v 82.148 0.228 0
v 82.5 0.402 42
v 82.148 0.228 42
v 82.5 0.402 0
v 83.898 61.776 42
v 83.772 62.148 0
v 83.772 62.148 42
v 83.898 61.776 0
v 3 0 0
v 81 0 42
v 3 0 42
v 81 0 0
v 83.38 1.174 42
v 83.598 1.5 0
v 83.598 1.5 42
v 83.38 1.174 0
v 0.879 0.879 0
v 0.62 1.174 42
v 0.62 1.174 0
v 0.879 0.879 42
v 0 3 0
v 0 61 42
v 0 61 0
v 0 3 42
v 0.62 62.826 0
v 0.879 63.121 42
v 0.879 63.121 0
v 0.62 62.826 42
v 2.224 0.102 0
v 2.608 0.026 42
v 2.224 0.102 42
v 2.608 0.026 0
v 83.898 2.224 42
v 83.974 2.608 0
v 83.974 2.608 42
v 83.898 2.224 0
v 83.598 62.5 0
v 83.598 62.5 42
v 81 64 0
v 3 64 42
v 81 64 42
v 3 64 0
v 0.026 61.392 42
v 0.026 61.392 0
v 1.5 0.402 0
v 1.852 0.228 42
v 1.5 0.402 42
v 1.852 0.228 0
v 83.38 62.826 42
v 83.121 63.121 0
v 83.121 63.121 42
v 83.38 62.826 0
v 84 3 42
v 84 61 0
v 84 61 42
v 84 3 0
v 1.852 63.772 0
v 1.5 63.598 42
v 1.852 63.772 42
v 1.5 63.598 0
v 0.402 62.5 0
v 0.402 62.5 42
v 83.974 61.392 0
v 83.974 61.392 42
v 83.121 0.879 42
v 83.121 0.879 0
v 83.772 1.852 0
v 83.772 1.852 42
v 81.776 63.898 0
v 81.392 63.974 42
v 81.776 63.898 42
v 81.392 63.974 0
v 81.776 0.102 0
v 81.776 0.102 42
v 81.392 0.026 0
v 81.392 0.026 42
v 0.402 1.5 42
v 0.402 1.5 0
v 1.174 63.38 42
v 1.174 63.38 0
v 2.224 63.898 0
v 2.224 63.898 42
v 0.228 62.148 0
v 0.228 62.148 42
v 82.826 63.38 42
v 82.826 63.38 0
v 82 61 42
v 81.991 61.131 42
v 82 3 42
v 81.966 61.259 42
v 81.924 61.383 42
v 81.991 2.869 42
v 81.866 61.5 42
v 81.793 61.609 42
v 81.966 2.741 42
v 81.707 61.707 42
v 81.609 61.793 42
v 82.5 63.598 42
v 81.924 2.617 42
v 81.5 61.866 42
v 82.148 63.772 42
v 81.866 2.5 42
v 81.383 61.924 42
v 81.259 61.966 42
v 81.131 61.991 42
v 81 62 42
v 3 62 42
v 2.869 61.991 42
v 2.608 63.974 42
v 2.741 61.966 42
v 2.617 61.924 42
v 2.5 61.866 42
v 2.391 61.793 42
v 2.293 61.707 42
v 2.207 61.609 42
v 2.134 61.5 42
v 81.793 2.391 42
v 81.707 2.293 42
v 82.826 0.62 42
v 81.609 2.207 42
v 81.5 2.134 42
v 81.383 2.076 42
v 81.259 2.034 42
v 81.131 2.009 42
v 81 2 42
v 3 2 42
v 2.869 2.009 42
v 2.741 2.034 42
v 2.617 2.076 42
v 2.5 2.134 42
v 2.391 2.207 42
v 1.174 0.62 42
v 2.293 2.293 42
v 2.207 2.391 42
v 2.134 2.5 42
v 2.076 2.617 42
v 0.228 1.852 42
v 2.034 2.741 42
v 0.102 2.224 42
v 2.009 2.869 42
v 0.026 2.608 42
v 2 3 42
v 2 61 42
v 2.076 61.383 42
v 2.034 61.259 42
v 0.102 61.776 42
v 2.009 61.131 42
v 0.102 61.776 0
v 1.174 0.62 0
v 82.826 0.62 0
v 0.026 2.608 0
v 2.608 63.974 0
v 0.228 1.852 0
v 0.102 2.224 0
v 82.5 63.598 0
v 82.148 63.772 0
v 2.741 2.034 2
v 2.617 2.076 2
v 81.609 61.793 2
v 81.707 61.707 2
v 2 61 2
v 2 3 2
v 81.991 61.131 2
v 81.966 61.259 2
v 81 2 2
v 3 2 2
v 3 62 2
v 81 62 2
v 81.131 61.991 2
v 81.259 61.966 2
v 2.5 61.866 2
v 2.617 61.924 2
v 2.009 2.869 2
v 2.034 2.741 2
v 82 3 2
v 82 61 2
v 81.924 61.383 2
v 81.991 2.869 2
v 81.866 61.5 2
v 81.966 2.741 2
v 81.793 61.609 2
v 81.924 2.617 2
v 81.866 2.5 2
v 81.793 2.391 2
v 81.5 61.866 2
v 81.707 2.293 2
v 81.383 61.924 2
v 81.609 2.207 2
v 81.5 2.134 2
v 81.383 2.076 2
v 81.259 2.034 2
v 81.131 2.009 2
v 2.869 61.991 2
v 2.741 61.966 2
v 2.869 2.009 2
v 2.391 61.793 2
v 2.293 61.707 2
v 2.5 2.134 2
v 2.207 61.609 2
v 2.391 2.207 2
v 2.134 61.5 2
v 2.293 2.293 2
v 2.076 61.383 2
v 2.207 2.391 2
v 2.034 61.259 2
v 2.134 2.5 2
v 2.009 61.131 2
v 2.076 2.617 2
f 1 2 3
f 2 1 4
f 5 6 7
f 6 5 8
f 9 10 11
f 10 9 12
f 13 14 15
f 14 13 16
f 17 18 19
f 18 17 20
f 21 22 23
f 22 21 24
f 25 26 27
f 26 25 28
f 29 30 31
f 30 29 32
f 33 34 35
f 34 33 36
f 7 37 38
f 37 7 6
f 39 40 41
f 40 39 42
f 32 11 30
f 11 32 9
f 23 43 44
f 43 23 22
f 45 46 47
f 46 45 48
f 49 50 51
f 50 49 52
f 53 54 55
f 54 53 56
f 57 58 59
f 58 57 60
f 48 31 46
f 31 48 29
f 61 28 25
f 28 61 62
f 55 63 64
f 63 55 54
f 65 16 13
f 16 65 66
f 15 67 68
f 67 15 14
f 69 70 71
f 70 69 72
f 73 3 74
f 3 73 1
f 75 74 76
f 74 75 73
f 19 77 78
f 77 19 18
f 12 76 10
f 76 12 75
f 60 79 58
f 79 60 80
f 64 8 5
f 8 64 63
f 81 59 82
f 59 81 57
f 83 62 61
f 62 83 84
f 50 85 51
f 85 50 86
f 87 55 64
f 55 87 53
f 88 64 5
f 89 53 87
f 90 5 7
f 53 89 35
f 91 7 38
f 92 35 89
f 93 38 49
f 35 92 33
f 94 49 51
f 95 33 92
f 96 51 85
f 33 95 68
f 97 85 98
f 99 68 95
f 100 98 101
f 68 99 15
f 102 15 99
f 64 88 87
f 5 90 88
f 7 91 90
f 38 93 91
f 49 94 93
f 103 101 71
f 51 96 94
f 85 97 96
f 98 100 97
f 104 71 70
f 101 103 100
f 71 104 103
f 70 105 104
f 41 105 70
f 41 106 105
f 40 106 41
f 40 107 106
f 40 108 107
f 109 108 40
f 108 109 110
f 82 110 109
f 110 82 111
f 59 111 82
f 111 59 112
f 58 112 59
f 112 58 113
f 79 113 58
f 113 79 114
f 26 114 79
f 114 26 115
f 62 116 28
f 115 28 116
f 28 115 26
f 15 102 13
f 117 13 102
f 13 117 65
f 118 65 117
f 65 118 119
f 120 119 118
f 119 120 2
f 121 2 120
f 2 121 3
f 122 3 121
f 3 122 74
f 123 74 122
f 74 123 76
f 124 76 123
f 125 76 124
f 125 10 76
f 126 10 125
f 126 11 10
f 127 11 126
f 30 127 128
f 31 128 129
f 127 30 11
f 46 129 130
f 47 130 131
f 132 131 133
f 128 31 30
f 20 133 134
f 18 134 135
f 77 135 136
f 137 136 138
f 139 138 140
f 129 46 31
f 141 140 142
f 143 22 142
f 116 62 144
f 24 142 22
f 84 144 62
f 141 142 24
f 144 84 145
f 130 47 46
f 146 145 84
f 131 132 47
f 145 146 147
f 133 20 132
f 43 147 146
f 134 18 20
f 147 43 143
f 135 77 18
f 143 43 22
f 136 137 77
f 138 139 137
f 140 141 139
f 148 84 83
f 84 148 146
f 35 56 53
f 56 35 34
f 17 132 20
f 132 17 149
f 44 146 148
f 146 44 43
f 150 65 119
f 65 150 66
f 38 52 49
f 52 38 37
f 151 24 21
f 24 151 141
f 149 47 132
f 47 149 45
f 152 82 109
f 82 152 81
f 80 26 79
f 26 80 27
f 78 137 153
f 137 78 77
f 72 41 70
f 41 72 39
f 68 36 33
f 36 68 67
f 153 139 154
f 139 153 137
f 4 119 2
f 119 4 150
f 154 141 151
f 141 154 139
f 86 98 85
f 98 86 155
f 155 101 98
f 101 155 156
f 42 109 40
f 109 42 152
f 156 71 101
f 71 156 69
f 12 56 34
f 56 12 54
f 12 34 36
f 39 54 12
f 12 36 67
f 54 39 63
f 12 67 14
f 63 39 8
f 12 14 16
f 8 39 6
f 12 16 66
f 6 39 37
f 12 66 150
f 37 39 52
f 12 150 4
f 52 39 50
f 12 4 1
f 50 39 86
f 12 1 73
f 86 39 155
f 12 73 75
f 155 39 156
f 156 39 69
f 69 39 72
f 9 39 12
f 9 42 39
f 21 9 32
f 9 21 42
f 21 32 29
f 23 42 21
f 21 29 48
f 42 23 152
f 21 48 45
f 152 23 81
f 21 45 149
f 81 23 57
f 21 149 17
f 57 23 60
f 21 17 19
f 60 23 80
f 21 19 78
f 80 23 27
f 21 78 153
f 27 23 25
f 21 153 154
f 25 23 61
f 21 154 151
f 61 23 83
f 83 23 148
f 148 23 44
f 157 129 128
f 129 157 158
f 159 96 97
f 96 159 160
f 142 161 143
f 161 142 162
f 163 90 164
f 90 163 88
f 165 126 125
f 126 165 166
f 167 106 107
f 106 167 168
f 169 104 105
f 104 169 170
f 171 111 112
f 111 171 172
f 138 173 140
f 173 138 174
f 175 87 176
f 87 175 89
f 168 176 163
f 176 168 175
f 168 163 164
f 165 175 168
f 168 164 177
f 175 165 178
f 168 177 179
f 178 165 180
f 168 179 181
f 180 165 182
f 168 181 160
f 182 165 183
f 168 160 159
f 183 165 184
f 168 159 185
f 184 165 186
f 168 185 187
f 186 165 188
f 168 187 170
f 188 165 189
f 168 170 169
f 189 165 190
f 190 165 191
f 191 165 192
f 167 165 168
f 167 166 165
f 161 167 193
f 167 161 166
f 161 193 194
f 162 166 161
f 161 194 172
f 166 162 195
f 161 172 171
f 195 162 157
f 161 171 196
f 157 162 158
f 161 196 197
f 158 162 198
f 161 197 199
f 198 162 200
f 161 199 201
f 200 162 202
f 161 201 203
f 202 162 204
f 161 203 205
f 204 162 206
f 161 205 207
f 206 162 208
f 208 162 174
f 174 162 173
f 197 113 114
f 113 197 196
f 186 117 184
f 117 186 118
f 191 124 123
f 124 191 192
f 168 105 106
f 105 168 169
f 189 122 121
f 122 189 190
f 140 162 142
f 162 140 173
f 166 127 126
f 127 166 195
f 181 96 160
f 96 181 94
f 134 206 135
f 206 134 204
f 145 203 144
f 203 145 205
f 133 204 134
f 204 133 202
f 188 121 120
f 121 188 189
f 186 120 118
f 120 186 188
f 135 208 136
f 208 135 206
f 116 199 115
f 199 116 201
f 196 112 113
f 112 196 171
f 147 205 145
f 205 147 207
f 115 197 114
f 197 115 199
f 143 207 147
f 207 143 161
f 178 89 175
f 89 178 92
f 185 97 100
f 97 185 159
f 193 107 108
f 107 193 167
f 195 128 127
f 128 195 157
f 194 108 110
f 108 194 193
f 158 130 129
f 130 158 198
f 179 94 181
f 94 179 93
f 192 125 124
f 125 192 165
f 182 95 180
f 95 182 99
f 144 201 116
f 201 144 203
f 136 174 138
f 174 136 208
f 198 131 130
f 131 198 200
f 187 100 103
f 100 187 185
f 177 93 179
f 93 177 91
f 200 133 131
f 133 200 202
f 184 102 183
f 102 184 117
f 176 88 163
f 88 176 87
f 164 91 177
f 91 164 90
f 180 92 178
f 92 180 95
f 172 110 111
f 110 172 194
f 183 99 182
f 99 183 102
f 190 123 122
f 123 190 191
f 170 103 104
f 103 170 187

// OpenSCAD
// Parametric Box Generator
// A configurable rectangular box with optional lid recess and rounded corners.

/* [Dimensions] */
// Inner width (mm)
width = 80;            // [20:300]
// Inner depth (mm)
depth = 60;            // [20:300]
// Inner height (mm)
height = 40;           // [10:300]
// Wall thickness (mm)
wall_thickness = 2;    // [1:0.5:8]

/* [Style] */
// Corner rounding radius (mm, 0 = sharp)
corner_radius = 3;     // [0:0.5:20]
// Add a solid bottom
closed_bottom = true;

/* [Quality] */
$fn = 48;              // [12:4:120]

module rounded_box(w, d, h, r) {
    if (r <= 0) {
        cube([w, d, h]);
    } else {
        hull() {
            for (x = [r, w - r], y = [r, d - r])
                translate([x, y, 0]) cylinder(h = h, r = r);
        }
    }
}

module box() {
    outer_w = width + 2 * wall_thickness;
    outer_d = depth + 2 * wall_thickness;
    outer_h = height + (closed_bottom ? wall_thickness : 0);
    difference() {
        rounded_box(outer_w, outer_d, outer_h, corner_radius);
        translate([wall_thickness, wall_thickness, closed_bottom ? wall_thickness : -1])
            rounded_box(width, depth, height + 1, max(0, corner_radius - wall_thickness));
    }
}

box();
